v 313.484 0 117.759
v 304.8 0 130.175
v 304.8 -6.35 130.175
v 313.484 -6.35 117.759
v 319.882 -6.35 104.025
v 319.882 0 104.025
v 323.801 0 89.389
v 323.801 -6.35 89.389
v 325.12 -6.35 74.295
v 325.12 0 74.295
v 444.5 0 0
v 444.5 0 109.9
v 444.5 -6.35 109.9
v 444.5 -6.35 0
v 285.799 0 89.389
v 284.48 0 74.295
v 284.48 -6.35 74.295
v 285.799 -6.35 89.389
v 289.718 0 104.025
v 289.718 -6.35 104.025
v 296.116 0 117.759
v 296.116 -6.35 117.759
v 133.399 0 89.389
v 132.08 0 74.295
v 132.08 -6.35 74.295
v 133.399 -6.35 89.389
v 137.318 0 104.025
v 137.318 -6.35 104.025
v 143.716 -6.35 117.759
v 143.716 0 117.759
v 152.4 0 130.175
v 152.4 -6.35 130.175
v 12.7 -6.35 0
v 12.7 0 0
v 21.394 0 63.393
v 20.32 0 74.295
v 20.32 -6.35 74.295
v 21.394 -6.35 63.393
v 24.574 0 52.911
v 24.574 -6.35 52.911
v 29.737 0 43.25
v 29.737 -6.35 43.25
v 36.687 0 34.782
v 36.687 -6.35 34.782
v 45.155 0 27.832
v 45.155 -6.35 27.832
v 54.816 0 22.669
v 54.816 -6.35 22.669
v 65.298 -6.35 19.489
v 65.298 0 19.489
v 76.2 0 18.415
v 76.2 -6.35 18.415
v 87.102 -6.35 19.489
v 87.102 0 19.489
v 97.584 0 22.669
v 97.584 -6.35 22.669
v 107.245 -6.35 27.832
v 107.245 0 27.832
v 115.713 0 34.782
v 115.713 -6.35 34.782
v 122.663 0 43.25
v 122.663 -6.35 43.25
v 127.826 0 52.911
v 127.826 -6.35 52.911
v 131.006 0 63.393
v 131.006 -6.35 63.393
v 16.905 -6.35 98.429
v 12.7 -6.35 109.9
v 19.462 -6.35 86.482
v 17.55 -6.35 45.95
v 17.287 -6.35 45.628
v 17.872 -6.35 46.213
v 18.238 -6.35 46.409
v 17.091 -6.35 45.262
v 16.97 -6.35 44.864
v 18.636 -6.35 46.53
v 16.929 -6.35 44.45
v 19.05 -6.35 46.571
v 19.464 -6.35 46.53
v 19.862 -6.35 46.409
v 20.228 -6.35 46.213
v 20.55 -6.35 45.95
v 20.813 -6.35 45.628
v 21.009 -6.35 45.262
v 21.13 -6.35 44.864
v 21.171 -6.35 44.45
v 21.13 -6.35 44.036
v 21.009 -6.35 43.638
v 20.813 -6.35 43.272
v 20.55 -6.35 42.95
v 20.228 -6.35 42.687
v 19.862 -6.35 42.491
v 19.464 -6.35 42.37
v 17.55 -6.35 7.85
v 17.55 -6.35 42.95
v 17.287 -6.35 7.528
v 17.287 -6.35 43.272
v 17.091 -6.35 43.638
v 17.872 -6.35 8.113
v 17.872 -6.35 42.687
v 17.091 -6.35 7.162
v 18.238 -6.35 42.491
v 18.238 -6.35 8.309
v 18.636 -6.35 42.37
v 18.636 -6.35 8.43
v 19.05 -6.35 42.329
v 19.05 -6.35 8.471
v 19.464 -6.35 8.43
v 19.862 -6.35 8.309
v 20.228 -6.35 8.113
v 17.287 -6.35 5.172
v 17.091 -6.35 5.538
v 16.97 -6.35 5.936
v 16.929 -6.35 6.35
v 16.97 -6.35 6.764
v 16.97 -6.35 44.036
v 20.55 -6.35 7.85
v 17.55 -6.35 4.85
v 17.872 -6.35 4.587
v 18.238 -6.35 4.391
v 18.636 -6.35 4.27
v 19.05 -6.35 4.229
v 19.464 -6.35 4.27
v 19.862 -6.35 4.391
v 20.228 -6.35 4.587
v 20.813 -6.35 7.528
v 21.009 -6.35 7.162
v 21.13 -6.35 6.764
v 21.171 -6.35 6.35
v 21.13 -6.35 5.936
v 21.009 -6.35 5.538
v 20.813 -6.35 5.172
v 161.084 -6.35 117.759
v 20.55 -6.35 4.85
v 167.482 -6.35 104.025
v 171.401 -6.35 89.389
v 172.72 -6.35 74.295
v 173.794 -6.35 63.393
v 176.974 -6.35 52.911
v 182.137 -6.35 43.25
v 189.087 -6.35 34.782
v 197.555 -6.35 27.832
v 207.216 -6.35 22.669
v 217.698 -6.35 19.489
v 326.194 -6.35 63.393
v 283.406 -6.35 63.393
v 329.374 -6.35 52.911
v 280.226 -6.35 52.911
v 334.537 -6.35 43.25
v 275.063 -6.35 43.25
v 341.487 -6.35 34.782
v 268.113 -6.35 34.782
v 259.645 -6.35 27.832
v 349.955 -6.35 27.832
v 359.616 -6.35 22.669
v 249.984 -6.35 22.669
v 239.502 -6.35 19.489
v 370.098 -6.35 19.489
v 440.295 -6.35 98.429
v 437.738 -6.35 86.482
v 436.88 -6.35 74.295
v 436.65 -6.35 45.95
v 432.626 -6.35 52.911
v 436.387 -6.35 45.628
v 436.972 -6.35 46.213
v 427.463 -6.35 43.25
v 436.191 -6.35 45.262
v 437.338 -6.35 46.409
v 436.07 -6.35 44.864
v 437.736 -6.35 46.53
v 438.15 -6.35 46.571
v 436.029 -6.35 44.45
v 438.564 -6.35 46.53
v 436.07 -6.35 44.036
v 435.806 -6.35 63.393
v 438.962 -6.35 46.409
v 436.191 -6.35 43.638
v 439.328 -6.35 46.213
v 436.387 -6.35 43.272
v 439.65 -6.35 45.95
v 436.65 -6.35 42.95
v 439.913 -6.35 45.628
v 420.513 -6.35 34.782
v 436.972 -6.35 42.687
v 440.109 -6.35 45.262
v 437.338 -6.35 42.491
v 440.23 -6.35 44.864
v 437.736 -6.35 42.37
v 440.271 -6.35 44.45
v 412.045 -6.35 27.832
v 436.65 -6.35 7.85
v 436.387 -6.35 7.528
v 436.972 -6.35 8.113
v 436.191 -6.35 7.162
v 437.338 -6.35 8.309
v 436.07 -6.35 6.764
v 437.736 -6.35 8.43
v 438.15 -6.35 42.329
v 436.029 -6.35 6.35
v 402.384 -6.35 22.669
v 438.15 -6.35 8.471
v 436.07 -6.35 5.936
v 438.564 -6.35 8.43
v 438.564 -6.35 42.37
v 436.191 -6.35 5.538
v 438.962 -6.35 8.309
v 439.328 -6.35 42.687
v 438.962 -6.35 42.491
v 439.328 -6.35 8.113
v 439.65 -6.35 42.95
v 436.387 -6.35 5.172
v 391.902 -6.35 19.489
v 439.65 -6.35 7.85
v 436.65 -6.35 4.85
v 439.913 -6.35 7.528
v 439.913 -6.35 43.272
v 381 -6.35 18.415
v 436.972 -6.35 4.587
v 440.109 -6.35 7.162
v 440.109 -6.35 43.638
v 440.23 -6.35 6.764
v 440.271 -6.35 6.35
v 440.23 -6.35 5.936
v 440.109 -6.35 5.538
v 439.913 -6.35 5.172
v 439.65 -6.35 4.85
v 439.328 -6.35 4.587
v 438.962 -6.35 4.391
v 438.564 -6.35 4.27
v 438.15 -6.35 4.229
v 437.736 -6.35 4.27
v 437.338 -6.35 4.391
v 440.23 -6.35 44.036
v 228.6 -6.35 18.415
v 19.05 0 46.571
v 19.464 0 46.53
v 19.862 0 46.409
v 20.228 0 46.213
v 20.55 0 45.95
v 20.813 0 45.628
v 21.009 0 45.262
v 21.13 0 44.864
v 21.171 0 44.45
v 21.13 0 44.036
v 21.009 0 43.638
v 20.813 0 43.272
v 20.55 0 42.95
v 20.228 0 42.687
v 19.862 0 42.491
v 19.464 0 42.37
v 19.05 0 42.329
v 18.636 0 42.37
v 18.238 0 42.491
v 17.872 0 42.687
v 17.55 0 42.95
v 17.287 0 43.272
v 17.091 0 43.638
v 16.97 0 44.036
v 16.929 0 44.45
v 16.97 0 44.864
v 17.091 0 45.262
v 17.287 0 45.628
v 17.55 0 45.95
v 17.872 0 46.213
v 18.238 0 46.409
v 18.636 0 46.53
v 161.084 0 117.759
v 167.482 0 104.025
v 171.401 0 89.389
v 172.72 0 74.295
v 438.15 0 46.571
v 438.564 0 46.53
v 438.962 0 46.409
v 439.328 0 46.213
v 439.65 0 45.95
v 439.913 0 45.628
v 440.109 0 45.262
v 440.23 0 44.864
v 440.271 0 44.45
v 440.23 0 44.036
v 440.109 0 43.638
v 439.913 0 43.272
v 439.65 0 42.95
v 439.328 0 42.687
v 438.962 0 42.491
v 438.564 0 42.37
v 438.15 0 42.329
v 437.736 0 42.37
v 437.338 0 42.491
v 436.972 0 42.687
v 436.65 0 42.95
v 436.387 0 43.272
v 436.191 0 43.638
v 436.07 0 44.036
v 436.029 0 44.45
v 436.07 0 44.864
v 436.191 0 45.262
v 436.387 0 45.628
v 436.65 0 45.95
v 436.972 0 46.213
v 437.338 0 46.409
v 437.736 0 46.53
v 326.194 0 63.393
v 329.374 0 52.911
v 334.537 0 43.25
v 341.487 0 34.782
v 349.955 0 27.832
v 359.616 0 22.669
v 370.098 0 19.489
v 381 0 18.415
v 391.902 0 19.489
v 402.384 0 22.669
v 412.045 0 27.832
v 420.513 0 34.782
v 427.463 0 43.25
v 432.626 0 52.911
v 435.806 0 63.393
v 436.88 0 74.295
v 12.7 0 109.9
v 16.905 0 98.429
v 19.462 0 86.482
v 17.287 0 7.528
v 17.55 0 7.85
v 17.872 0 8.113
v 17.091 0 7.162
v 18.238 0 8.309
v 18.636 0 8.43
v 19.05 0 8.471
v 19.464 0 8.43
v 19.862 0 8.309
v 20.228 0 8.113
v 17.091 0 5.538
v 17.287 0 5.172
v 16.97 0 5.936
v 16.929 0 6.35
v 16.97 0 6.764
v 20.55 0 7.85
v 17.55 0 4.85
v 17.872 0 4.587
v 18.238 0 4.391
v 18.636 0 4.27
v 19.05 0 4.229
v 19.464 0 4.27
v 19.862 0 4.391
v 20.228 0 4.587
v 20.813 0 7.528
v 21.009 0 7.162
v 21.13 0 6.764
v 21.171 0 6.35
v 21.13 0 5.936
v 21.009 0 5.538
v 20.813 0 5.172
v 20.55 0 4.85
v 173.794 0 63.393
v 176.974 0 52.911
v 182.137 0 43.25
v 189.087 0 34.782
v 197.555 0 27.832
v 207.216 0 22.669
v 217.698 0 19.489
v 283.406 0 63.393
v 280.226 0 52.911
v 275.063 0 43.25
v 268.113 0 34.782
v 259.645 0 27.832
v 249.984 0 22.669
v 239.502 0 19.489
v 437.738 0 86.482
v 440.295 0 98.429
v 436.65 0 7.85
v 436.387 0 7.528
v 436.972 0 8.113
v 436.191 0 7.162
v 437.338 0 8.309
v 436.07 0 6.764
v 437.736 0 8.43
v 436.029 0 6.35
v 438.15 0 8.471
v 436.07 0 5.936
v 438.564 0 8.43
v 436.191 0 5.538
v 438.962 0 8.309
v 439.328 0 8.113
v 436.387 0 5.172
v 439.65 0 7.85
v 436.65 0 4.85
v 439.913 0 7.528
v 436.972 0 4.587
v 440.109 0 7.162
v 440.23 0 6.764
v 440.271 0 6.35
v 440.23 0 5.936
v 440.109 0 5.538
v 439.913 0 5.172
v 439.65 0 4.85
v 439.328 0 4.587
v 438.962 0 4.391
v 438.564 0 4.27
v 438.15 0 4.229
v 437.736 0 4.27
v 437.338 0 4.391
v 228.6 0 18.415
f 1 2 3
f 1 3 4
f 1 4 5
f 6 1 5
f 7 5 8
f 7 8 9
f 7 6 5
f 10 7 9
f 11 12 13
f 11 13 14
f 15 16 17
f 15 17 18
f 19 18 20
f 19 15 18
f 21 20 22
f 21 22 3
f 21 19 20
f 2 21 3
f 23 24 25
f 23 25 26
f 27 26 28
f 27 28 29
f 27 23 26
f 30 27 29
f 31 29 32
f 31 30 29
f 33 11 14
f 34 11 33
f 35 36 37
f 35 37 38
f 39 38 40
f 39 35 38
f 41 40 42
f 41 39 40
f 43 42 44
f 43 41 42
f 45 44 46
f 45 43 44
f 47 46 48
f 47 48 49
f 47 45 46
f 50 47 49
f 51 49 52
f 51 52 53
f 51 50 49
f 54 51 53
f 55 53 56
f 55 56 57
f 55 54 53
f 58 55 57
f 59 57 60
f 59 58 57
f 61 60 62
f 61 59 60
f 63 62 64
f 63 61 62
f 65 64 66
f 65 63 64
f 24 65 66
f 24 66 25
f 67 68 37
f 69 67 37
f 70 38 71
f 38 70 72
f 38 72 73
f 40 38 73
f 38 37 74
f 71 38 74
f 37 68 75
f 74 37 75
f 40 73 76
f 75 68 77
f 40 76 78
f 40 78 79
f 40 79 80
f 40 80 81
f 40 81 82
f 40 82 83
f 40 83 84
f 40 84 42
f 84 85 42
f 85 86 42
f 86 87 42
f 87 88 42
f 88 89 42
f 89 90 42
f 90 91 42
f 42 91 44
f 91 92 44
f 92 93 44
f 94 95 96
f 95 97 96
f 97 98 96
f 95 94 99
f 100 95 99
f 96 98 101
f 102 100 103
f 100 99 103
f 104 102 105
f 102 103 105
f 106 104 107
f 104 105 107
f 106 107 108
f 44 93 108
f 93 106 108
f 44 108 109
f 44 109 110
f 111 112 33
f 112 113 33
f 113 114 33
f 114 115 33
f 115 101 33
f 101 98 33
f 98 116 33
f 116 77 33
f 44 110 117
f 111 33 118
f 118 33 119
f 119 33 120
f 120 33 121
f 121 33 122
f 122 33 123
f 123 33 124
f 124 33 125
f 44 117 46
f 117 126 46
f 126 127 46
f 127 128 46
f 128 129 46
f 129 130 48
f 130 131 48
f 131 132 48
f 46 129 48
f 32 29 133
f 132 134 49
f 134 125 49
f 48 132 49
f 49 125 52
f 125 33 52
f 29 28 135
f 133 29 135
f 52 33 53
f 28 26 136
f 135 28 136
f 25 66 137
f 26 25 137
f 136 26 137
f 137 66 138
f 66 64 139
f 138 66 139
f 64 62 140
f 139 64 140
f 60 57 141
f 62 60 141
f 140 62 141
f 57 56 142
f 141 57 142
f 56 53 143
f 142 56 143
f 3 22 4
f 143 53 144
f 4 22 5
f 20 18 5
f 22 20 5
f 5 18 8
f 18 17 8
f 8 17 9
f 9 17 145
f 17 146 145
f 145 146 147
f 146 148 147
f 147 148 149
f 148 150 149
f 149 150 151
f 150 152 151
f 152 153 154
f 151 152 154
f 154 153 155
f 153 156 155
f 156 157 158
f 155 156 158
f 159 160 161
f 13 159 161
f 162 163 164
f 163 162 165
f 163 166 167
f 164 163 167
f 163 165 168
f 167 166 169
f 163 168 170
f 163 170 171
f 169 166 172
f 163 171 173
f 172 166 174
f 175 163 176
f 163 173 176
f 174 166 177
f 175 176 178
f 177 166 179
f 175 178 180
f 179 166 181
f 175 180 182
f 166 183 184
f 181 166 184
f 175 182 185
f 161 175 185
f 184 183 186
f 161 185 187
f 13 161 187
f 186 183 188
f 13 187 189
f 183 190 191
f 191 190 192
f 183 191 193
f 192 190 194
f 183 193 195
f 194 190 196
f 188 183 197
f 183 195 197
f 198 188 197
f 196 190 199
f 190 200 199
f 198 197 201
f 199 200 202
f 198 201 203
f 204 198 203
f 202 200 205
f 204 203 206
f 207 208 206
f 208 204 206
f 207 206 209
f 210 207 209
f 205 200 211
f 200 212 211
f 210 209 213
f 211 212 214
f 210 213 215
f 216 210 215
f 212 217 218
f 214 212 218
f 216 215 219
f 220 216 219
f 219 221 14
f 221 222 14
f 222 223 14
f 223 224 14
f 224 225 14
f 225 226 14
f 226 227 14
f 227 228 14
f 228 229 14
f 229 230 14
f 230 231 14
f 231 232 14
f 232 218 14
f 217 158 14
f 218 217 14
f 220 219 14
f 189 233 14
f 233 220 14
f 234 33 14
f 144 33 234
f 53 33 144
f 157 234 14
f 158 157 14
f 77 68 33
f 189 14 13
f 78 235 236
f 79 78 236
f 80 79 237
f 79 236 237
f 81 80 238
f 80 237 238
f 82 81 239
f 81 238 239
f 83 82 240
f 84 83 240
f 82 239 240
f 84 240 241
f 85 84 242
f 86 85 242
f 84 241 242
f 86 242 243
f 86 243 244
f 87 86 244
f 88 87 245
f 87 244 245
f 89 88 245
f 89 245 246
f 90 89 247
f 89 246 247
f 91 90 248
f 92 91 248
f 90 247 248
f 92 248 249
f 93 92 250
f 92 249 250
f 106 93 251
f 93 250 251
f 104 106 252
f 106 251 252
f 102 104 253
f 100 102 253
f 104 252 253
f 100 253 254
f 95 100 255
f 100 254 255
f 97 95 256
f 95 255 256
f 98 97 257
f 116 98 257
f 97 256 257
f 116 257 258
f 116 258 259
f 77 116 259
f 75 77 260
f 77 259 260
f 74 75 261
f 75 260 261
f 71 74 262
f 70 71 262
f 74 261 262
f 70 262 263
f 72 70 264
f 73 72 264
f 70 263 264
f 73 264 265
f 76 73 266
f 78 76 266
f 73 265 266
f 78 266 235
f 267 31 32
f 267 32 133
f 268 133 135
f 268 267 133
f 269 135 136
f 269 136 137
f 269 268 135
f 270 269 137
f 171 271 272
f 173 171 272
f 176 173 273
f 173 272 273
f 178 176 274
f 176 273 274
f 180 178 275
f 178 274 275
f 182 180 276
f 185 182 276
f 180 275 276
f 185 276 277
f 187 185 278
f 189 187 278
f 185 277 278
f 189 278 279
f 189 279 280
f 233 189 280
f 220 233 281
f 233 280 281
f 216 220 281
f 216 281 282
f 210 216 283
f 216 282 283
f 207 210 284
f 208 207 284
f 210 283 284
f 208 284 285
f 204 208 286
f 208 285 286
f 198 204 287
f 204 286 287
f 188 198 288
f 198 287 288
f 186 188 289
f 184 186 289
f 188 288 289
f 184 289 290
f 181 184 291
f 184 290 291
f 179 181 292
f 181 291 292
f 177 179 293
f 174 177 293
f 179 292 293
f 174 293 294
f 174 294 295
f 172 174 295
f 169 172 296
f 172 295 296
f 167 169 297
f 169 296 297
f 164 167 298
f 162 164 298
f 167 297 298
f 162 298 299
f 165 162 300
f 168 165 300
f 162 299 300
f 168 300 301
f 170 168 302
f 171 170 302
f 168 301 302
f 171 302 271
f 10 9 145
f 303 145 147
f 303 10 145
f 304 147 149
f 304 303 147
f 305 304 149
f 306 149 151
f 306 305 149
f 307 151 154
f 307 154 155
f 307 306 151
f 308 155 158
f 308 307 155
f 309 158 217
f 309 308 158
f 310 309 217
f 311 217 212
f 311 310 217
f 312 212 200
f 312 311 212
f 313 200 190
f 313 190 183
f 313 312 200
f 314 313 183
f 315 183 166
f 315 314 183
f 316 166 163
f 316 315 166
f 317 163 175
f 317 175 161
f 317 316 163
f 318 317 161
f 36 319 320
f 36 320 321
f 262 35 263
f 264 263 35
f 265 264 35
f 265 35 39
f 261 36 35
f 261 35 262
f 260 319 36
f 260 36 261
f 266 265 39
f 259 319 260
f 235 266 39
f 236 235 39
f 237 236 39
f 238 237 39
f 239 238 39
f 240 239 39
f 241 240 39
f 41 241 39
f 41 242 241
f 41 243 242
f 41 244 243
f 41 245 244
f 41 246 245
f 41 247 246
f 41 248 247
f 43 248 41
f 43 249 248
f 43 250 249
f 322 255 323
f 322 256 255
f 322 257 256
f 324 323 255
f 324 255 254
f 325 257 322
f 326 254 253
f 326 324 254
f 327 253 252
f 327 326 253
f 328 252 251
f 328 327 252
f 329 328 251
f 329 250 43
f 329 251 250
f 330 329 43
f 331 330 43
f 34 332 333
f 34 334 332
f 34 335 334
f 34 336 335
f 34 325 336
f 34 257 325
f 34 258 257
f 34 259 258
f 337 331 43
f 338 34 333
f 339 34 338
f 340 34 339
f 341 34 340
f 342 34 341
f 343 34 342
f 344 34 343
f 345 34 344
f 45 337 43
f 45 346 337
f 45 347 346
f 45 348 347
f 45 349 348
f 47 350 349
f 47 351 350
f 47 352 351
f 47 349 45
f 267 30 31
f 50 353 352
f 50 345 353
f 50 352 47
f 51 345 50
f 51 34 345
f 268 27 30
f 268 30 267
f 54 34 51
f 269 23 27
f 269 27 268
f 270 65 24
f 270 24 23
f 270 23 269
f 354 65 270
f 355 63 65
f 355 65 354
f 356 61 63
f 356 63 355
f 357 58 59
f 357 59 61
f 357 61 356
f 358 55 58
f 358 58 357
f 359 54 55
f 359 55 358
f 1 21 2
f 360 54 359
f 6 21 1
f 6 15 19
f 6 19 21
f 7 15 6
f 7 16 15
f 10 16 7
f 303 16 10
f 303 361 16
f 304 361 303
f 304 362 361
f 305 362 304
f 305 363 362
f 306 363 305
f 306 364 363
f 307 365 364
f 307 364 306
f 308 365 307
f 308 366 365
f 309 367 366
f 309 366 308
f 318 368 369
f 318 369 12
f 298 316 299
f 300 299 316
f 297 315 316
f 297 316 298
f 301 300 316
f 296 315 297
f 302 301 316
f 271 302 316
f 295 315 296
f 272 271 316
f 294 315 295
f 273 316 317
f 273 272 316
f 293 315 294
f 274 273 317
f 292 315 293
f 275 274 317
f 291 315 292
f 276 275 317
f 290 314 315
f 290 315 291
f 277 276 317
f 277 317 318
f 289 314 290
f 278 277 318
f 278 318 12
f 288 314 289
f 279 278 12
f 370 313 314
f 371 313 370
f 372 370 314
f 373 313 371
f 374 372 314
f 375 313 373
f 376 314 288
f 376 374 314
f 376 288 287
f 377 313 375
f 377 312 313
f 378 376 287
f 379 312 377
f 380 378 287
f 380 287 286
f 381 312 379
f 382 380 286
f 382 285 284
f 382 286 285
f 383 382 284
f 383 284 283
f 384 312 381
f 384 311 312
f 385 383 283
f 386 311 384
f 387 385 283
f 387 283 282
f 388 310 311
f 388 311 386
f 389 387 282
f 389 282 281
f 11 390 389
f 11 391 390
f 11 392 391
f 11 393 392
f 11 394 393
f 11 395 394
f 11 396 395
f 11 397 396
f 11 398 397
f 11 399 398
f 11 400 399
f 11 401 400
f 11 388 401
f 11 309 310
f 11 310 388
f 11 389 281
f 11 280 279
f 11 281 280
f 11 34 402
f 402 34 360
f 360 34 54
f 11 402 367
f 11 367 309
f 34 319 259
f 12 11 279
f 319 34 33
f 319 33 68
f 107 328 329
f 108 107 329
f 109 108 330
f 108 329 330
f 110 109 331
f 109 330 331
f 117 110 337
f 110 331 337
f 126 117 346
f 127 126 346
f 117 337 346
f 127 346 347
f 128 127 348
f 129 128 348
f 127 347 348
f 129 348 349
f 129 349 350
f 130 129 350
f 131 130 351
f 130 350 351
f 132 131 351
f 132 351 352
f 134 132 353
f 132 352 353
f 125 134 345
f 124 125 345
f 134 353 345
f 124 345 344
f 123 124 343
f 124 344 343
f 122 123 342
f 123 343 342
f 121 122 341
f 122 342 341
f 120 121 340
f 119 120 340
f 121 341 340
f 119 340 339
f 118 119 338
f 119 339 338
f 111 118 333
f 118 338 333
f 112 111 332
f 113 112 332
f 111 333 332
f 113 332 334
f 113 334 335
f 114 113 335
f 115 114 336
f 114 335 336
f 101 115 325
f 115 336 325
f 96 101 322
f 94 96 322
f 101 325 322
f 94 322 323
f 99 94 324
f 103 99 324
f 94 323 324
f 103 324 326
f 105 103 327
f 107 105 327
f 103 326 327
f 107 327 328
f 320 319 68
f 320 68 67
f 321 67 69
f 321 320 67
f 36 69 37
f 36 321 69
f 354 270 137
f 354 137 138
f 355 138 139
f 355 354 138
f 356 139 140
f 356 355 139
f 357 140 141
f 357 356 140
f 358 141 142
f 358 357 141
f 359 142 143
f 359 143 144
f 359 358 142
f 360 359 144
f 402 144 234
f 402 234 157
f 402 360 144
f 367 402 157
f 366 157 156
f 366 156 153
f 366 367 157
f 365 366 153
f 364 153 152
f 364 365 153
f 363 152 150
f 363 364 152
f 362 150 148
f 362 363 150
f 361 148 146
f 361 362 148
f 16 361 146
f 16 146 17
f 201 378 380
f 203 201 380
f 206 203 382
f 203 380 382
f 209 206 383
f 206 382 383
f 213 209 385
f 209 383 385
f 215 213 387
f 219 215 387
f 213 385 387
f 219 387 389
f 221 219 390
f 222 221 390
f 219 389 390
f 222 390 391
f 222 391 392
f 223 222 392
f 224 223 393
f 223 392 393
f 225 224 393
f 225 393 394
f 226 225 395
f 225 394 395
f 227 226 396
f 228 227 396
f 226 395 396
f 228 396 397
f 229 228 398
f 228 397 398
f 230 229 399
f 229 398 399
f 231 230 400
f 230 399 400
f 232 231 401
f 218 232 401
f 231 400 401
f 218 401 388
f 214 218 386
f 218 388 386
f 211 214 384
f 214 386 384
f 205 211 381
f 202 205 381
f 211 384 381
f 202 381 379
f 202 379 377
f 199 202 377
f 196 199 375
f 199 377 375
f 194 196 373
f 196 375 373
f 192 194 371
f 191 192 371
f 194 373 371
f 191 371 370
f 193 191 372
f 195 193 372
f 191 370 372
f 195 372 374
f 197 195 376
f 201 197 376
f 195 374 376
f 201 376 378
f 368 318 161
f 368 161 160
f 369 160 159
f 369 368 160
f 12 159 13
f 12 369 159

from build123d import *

# Parameters (mm, degrees)
SKETCH1_R           = 2.1209
BOSS_EXTRUDE1_DEPTH = 6.35


with BuildPart() as part:
    # Sketch1 → Boss-Extrude1 (new body)
    with BuildSketch(Plane(origin=(0, 0, 0), x_dir=(1, 0, 0), z_dir=(0, 1, 0))):
        with BuildLine():
            ThreePointArc((132.08, -74.295), (137.317671124, -104.024937773), (152.4, -130.175))
            ThreePointArc((152.4, -130.175), (167.482328876, -104.024937773), (172.72, -74.295))
            ThreePointArc((172.72, -74.295), (228.6, -18.415), (284.48, -74.295))
            ThreePointArc((284.48, -74.295), (289.717671124, -104.024937773), (304.8, -130.175))
            ThreePointArc((304.8, -130.175), (319.882328876, -104.024937773), (325.12, -74.295))
            ThreePointArc((325.12, -74.295), (381, -18.415), (436.88, -74.295))
            ThreePointArc((436.88, -74.295), (438.8063273, -92.500794407), (444.5, -109.900328253))
            Line((444.5, -109.900328253), (444.5, 0))
            Line((444.5, 0), (12.7, 0))
            Line((12.7, 0), (12.7, -109.900328253))
            ThreePointArc((12.7, -109.900328253), (18.3936727, -92.500794407), (20.32, -74.295))
            ThreePointArc((20.32, -74.295), (76.2, -18.415), (132.08, -74.295))
        make_face()
        with Locations((19.05, -44.45)):
            Circle(SKETCH1_R, mode=Mode.SUBTRACT)
        with Locations((19.05, -6.35)):
            Circle(SKETCH1_R, mode=Mode.SUBTRACT)
        with Locations((438.15, -6.35)):
            Circle(SKETCH1_R, mode=Mode.SUBTRACT)
        with Locations((438.15, -44.45)):
            Circle(SKETCH1_R, mode=Mode.SUBTRACT)
    extrude(amount=-BOSS_EXTRUDE1_DEPTH)


solid = part.part
